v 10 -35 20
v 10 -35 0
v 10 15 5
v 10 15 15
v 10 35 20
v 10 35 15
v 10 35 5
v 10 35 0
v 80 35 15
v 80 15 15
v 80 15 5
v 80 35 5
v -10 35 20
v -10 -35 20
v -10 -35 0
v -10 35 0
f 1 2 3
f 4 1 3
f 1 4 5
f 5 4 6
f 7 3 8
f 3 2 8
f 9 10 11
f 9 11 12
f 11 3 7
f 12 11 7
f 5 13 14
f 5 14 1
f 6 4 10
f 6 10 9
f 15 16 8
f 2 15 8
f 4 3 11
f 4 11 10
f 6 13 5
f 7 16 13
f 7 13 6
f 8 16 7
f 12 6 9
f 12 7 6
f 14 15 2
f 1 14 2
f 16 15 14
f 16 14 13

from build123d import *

# Parameters (mm, degrees)
F0_W     = 20
F0_H     = 70
F1_DEPTH = 20
F2_W     = 20
F2_H     = 10
F3_DEPTH = 70


with BuildPart() as f1:
    # F0 (on Top) → F1 (new body)
    with BuildSketch(Plane.XY):
        Rectangle(F0_W, F0_H)
    extrude(amount=F1_DEPTH)

    # F2 (on face) → F3 (join)
    with BuildSketch(Plane.YZ.offset(10)):
        with Locations((25, 10)):
            Rectangle(F2_W, F2_H)
    extrude(amount=F3_DEPTH)


solid = f1.part
